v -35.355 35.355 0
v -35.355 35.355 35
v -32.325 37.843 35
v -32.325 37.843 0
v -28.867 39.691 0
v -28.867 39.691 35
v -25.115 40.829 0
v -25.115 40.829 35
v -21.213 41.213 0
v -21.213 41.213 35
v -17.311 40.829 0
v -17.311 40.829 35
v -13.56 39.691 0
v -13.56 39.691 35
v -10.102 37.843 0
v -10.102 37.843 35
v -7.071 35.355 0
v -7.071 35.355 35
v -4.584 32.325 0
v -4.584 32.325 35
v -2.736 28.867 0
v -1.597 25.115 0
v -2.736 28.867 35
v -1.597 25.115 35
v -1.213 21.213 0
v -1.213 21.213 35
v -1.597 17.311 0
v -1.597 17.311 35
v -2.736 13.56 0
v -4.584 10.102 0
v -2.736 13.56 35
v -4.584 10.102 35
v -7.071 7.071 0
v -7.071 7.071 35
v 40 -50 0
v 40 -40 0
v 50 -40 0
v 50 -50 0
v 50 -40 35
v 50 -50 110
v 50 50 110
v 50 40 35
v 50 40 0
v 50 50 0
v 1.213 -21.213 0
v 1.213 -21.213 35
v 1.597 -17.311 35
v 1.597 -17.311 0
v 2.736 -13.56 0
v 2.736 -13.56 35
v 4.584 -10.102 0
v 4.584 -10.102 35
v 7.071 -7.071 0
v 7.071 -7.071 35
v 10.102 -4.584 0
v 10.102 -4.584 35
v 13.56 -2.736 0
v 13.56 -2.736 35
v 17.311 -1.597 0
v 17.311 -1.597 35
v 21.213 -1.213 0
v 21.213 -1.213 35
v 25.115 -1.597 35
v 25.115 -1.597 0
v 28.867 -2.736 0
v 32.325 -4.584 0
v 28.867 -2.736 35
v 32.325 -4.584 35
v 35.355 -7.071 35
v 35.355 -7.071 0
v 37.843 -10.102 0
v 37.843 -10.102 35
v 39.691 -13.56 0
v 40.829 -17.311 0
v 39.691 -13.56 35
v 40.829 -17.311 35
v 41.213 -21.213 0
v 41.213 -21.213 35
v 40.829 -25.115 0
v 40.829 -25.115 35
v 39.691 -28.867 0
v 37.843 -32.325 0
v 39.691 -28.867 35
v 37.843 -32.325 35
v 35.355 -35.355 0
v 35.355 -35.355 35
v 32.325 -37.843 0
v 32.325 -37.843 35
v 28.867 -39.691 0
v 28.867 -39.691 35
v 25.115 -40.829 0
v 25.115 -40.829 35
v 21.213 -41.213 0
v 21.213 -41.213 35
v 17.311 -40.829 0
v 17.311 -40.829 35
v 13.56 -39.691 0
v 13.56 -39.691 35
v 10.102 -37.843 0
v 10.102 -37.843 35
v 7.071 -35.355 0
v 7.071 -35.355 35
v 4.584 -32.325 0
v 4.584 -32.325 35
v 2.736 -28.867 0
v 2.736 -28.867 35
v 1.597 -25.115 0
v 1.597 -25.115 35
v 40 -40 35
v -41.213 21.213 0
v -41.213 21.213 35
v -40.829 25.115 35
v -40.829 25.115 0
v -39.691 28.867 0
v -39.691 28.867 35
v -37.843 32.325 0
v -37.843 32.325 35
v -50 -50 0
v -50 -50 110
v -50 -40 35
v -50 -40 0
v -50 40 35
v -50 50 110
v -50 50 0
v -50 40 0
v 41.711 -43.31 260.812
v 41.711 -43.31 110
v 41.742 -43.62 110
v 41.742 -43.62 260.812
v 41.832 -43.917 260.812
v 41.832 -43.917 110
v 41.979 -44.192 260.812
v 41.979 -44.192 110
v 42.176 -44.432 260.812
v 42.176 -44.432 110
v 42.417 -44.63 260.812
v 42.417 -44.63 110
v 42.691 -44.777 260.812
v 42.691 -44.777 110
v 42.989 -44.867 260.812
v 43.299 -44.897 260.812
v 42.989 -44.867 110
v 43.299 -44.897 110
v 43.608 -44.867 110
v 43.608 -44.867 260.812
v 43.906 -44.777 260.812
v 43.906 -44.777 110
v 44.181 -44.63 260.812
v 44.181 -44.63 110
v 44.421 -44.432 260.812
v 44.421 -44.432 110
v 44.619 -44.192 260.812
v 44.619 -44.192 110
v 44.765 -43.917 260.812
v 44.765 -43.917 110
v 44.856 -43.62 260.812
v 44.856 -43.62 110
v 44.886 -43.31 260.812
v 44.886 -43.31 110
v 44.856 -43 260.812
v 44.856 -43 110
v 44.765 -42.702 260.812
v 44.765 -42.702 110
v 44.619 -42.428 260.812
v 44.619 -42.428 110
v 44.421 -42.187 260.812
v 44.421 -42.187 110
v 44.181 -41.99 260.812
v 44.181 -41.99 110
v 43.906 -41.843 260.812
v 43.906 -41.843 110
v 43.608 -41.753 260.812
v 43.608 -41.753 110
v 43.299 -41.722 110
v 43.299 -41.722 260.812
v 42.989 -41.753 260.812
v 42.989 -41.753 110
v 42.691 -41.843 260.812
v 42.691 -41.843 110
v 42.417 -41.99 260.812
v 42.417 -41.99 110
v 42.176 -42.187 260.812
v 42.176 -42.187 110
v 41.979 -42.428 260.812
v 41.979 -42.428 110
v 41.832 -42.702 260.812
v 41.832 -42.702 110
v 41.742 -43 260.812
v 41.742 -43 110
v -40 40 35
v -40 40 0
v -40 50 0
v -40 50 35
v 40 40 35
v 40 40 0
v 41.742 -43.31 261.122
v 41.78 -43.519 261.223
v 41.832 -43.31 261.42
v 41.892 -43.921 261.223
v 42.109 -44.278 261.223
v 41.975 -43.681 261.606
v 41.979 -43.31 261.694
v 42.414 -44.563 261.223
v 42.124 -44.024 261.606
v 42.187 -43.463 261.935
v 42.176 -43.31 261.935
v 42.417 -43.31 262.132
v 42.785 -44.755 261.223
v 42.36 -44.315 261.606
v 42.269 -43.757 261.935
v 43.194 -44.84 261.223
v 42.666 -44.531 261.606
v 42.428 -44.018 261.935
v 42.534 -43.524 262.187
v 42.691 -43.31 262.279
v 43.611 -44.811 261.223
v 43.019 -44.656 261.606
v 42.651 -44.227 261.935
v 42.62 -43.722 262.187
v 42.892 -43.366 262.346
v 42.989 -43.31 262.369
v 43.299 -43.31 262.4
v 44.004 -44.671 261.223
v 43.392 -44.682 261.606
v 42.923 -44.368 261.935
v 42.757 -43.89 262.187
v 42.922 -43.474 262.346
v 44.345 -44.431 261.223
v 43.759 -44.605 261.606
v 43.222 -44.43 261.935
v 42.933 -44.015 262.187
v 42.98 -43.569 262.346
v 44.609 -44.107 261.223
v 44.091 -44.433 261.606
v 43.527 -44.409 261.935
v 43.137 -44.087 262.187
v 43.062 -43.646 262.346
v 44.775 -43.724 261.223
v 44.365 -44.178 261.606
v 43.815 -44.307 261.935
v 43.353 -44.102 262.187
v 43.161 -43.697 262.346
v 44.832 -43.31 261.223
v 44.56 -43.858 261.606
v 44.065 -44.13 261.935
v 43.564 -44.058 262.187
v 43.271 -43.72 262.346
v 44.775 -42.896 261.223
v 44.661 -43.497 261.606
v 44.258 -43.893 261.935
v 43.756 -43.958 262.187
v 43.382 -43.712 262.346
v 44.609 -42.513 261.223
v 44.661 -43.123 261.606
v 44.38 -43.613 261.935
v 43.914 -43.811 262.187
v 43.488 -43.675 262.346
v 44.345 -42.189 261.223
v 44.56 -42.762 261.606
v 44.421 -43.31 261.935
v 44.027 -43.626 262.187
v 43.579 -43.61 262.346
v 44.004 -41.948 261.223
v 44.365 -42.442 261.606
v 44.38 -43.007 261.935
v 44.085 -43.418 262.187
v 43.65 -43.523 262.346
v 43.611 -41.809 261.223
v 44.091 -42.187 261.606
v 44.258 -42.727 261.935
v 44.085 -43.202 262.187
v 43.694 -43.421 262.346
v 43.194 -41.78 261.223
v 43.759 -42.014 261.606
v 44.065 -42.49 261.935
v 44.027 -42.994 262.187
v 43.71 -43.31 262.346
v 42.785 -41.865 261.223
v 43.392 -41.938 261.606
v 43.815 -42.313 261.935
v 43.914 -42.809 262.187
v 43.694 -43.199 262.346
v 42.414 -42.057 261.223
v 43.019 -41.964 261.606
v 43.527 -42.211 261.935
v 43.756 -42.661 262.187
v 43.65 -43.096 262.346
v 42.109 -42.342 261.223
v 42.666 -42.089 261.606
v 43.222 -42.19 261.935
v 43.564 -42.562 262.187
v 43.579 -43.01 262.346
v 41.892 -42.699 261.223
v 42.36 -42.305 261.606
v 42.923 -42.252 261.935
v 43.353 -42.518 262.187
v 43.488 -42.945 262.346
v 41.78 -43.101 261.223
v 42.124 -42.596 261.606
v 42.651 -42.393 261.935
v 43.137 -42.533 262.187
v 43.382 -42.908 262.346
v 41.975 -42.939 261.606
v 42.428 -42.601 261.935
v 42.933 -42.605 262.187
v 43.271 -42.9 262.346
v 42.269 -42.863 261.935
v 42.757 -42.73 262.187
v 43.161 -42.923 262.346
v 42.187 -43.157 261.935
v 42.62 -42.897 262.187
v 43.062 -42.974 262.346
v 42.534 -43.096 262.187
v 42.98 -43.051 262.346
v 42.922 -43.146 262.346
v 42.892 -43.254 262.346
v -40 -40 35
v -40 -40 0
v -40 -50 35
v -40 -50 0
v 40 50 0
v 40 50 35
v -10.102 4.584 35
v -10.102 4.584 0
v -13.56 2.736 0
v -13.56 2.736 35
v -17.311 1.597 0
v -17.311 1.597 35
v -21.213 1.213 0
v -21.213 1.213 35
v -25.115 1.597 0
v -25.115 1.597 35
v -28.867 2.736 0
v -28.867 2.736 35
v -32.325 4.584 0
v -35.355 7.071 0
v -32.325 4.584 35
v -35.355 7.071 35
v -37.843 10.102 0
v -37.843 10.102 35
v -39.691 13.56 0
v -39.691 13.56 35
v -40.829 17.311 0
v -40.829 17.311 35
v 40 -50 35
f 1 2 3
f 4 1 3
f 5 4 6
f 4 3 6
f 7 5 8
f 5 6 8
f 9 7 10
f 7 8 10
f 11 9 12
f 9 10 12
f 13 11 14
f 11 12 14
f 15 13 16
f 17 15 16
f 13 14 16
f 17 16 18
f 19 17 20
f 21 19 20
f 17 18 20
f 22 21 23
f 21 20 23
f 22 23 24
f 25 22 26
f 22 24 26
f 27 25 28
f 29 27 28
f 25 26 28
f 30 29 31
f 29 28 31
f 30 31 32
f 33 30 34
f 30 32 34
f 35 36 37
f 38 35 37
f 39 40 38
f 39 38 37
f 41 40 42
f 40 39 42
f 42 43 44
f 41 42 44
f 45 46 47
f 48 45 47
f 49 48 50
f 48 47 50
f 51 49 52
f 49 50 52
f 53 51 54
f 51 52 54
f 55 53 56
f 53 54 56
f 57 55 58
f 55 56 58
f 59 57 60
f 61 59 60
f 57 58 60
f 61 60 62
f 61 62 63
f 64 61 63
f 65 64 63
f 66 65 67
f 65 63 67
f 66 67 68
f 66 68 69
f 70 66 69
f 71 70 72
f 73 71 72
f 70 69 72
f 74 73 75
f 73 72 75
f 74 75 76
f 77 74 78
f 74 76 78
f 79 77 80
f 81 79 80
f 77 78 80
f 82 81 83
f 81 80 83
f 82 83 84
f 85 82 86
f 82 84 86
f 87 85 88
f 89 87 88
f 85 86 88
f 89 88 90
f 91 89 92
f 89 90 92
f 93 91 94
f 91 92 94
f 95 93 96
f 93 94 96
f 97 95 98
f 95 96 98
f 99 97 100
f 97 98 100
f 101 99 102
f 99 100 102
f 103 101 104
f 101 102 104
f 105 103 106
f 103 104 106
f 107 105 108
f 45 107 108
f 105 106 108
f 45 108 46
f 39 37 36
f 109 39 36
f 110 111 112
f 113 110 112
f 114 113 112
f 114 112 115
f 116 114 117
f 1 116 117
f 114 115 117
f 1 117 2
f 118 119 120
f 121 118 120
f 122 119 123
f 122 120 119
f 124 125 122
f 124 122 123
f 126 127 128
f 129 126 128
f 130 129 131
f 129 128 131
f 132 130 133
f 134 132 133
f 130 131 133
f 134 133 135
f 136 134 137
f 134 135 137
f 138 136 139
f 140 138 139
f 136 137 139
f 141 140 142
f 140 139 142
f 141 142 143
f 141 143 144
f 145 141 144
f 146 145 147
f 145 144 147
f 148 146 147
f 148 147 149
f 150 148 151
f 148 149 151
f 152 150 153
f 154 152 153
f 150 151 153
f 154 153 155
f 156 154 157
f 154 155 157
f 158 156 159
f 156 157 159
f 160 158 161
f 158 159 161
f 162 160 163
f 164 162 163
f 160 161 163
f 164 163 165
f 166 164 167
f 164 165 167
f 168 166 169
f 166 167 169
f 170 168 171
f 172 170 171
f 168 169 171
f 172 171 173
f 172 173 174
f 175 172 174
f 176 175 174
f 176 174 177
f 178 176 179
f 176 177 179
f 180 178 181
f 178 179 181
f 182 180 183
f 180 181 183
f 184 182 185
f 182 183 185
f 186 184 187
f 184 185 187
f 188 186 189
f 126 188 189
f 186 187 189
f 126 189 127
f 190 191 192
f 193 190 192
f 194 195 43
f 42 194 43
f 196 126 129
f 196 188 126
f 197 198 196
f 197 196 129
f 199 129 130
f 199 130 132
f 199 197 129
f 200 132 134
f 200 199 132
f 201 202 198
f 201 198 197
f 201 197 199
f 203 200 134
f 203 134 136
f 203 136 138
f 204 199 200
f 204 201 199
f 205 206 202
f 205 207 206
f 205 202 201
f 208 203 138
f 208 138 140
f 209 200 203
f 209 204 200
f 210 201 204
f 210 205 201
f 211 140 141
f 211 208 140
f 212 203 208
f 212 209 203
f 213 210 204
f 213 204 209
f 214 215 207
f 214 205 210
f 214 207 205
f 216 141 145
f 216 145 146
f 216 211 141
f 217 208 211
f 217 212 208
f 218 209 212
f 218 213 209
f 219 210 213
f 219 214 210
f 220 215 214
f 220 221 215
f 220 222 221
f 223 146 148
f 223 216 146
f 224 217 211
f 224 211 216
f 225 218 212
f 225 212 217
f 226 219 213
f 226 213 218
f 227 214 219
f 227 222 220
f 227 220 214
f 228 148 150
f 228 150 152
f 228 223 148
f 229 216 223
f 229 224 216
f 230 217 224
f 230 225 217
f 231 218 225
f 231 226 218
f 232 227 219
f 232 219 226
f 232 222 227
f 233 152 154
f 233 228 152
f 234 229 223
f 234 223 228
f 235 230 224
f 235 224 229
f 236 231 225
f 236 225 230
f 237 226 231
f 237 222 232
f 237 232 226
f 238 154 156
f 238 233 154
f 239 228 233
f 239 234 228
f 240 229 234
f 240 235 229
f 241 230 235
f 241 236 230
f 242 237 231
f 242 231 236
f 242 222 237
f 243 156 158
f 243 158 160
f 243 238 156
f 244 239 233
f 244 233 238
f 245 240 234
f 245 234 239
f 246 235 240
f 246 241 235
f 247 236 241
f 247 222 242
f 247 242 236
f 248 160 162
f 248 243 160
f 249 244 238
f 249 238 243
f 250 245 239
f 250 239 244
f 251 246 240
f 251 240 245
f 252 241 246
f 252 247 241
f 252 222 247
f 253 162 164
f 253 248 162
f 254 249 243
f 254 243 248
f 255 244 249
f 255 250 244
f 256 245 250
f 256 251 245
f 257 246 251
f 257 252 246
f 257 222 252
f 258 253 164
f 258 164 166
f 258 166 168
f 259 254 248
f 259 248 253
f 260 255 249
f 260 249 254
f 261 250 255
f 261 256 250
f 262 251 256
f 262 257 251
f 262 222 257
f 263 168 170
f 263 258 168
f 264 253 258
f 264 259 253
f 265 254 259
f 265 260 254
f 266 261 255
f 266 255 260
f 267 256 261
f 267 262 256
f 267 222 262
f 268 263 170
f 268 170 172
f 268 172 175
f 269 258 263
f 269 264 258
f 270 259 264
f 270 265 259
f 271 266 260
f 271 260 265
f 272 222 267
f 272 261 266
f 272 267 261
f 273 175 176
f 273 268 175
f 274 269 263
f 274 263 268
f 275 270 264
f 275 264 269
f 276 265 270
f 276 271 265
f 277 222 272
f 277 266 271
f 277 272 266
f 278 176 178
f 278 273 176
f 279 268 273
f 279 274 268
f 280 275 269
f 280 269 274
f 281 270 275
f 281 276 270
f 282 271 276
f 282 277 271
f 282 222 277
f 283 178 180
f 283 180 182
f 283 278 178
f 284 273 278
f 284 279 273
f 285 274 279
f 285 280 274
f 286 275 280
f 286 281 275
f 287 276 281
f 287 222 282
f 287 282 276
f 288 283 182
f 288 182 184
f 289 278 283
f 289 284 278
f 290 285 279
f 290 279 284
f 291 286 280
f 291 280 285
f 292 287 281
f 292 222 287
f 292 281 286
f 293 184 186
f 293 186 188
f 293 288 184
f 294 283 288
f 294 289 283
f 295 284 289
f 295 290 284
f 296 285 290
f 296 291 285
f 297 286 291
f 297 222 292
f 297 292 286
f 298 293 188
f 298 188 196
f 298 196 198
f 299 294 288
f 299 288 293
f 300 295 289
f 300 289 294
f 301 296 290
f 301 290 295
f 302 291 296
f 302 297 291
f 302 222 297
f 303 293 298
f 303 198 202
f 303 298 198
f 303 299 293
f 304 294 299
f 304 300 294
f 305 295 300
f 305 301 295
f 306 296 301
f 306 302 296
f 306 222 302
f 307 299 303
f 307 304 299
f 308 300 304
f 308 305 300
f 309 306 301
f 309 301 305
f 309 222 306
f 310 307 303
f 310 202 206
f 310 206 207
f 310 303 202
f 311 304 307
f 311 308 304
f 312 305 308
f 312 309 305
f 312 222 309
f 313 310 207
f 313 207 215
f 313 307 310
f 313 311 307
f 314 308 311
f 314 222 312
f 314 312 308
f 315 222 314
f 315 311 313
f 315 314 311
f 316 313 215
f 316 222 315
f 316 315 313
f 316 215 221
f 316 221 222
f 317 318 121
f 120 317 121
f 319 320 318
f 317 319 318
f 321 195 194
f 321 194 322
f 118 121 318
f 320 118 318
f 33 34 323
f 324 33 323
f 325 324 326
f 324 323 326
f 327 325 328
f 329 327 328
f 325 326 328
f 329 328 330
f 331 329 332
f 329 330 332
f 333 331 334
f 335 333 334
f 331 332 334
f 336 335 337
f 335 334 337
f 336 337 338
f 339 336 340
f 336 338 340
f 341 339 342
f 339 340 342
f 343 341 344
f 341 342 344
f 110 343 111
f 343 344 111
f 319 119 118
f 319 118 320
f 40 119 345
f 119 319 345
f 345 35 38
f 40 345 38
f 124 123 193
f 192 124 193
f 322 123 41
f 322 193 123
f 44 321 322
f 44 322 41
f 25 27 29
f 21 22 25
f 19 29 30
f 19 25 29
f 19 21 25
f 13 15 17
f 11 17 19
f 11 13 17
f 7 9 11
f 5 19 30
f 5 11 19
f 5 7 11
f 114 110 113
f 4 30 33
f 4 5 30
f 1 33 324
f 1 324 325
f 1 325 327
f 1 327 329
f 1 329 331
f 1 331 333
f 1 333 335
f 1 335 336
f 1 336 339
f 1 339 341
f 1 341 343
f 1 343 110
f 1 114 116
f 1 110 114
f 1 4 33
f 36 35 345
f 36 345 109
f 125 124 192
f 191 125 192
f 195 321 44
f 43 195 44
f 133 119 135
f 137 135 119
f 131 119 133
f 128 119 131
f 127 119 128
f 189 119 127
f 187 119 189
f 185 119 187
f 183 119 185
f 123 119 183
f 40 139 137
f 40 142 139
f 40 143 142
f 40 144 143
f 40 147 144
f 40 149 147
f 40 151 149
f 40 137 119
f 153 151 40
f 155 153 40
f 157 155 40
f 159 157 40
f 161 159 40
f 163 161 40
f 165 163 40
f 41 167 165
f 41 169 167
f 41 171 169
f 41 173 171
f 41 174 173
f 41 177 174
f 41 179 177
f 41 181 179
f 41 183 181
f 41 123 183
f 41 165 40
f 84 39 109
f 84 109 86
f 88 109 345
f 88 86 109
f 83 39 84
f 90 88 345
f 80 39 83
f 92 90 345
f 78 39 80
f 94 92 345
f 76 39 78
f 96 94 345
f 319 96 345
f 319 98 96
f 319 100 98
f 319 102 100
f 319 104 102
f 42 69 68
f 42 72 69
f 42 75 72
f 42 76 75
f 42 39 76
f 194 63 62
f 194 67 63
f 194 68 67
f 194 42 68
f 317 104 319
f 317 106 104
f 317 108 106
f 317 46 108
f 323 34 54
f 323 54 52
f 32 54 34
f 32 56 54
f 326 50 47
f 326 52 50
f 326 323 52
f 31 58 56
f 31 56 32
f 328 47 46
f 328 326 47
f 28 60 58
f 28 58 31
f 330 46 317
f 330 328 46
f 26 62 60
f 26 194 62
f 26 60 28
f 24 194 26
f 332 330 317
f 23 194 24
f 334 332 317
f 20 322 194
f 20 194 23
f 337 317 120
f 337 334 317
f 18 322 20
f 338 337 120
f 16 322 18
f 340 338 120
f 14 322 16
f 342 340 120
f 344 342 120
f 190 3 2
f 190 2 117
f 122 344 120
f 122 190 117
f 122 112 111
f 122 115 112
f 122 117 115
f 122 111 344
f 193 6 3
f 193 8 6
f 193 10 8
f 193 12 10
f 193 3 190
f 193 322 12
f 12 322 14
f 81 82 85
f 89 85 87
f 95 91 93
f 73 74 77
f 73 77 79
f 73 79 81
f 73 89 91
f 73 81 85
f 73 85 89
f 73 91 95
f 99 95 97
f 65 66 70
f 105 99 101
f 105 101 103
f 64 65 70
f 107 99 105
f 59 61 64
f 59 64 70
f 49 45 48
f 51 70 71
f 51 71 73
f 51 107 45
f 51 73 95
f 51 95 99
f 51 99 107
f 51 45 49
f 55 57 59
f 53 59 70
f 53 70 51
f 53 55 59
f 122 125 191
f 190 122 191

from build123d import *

# Parameters (mm, degrees)
SKETCH1_W           = 100
SKETCH1_H           = 100
BOSS_EXTRUDE1_DEPTH = 110
SKETCH2_R           = 1.5875
BOSS_EXTRUDE2_DEPTH = 152.4
FILLET1_R           = 1.5875
SKETCH4_W           = 10
SKETCH4_H           = 80
SKETCH4_W_2         = 80
SKETCH4_H_2         = 10
CUT_EXTRUDE2_DEPTH  = 35
SKETCH5_R           = 20
BOSS_EXTRUDE3_DEPTH = 35


with BuildPart() as part:
    # Sketch1 → Boss-Extrude1 (new body)
    with BuildSketch(Plane.XY):
        Rectangle(SKETCH1_W, SKETCH1_H)
    extrude(amount=BOSS_EXTRUDE1_DEPTH)

    # Sketch2 → Boss-Extrude2 (add)
    with BuildSketch(Plane.XY.offset(110)):
        with Locations(Location((43.298646859, -43.309895232, 0), (0, 0, 180))):
            Circle(SKETCH2_R)
    extrude(amount=BOSS_EXTRUDE2_DEPTH)

    # Fillet1
    fillet1_edges = [part.edges().sort_by_distance(p)[0] for p in [
        (44.886146859, -43.309895232, 262.4),
    ]]
    fillet(fillet1_edges, radius=FILLET1_R)

    # Sketch4 → Cut-Extrude2 (cut)
    with BuildSketch(Plane(origin=(0, 0, 0), x_dir=(-1, 0, 0), z_dir=(0, 0, -1))):
        with Locations((45, 0)):
            Rectangle(SKETCH4_W, SKETCH4_H)
        Rectangle(SKETCH4_W_2, SKETCH4_H)
        with Locations((-45, 0)):
            Rectangle(SKETCH4_W, SKETCH4_H)
        with Locations((0, -45)):
            Rectangle(SKETCH4_W_2, SKETCH4_H_2)
        with Locations((0, 45)):
            Rectangle(SKETCH4_W_2, SKETCH4_H_2)
    extrude(amount=-CUT_EXTRUDE2_DEPTH, mode=Mode.SUBTRACT)

    # Sketch5 → Boss-Extrude3 (add)
    with BuildSketch(Plane(origin=(0, 0, 35), x_dir=(-1, 0, 0), z_dir=(0, 0, -1))):
        with BuildLine():
            ThreePointArc((35.355339059, 35.355339059), (7.071067812, 35.355339059), (7.071067812, 7.071067812))
            Line((7.071067812, 7.071067812), (35.355339059, 35.355339059))
        make_face()
        with BuildLine():
            Line((35.355339059, 35.355339059), (7.071067812, 7.071067812))
            ThreePointArc((7.071067812, 7.071067812), (28.866872083, 2.735612785), (41.213203436, 21.213203436))
            ThreePointArc((41.213203436, 21.213203436), (39.690794086, 28.866872083), (35.355339059, 35.355339059))
        make_face()
        with Locations((-21.213203436, -21.213203436)):
            Circle(SKETCH5_R)
    extrude(amount=BOSS_EXTRUDE3_DEPTH)


solid = part.part
